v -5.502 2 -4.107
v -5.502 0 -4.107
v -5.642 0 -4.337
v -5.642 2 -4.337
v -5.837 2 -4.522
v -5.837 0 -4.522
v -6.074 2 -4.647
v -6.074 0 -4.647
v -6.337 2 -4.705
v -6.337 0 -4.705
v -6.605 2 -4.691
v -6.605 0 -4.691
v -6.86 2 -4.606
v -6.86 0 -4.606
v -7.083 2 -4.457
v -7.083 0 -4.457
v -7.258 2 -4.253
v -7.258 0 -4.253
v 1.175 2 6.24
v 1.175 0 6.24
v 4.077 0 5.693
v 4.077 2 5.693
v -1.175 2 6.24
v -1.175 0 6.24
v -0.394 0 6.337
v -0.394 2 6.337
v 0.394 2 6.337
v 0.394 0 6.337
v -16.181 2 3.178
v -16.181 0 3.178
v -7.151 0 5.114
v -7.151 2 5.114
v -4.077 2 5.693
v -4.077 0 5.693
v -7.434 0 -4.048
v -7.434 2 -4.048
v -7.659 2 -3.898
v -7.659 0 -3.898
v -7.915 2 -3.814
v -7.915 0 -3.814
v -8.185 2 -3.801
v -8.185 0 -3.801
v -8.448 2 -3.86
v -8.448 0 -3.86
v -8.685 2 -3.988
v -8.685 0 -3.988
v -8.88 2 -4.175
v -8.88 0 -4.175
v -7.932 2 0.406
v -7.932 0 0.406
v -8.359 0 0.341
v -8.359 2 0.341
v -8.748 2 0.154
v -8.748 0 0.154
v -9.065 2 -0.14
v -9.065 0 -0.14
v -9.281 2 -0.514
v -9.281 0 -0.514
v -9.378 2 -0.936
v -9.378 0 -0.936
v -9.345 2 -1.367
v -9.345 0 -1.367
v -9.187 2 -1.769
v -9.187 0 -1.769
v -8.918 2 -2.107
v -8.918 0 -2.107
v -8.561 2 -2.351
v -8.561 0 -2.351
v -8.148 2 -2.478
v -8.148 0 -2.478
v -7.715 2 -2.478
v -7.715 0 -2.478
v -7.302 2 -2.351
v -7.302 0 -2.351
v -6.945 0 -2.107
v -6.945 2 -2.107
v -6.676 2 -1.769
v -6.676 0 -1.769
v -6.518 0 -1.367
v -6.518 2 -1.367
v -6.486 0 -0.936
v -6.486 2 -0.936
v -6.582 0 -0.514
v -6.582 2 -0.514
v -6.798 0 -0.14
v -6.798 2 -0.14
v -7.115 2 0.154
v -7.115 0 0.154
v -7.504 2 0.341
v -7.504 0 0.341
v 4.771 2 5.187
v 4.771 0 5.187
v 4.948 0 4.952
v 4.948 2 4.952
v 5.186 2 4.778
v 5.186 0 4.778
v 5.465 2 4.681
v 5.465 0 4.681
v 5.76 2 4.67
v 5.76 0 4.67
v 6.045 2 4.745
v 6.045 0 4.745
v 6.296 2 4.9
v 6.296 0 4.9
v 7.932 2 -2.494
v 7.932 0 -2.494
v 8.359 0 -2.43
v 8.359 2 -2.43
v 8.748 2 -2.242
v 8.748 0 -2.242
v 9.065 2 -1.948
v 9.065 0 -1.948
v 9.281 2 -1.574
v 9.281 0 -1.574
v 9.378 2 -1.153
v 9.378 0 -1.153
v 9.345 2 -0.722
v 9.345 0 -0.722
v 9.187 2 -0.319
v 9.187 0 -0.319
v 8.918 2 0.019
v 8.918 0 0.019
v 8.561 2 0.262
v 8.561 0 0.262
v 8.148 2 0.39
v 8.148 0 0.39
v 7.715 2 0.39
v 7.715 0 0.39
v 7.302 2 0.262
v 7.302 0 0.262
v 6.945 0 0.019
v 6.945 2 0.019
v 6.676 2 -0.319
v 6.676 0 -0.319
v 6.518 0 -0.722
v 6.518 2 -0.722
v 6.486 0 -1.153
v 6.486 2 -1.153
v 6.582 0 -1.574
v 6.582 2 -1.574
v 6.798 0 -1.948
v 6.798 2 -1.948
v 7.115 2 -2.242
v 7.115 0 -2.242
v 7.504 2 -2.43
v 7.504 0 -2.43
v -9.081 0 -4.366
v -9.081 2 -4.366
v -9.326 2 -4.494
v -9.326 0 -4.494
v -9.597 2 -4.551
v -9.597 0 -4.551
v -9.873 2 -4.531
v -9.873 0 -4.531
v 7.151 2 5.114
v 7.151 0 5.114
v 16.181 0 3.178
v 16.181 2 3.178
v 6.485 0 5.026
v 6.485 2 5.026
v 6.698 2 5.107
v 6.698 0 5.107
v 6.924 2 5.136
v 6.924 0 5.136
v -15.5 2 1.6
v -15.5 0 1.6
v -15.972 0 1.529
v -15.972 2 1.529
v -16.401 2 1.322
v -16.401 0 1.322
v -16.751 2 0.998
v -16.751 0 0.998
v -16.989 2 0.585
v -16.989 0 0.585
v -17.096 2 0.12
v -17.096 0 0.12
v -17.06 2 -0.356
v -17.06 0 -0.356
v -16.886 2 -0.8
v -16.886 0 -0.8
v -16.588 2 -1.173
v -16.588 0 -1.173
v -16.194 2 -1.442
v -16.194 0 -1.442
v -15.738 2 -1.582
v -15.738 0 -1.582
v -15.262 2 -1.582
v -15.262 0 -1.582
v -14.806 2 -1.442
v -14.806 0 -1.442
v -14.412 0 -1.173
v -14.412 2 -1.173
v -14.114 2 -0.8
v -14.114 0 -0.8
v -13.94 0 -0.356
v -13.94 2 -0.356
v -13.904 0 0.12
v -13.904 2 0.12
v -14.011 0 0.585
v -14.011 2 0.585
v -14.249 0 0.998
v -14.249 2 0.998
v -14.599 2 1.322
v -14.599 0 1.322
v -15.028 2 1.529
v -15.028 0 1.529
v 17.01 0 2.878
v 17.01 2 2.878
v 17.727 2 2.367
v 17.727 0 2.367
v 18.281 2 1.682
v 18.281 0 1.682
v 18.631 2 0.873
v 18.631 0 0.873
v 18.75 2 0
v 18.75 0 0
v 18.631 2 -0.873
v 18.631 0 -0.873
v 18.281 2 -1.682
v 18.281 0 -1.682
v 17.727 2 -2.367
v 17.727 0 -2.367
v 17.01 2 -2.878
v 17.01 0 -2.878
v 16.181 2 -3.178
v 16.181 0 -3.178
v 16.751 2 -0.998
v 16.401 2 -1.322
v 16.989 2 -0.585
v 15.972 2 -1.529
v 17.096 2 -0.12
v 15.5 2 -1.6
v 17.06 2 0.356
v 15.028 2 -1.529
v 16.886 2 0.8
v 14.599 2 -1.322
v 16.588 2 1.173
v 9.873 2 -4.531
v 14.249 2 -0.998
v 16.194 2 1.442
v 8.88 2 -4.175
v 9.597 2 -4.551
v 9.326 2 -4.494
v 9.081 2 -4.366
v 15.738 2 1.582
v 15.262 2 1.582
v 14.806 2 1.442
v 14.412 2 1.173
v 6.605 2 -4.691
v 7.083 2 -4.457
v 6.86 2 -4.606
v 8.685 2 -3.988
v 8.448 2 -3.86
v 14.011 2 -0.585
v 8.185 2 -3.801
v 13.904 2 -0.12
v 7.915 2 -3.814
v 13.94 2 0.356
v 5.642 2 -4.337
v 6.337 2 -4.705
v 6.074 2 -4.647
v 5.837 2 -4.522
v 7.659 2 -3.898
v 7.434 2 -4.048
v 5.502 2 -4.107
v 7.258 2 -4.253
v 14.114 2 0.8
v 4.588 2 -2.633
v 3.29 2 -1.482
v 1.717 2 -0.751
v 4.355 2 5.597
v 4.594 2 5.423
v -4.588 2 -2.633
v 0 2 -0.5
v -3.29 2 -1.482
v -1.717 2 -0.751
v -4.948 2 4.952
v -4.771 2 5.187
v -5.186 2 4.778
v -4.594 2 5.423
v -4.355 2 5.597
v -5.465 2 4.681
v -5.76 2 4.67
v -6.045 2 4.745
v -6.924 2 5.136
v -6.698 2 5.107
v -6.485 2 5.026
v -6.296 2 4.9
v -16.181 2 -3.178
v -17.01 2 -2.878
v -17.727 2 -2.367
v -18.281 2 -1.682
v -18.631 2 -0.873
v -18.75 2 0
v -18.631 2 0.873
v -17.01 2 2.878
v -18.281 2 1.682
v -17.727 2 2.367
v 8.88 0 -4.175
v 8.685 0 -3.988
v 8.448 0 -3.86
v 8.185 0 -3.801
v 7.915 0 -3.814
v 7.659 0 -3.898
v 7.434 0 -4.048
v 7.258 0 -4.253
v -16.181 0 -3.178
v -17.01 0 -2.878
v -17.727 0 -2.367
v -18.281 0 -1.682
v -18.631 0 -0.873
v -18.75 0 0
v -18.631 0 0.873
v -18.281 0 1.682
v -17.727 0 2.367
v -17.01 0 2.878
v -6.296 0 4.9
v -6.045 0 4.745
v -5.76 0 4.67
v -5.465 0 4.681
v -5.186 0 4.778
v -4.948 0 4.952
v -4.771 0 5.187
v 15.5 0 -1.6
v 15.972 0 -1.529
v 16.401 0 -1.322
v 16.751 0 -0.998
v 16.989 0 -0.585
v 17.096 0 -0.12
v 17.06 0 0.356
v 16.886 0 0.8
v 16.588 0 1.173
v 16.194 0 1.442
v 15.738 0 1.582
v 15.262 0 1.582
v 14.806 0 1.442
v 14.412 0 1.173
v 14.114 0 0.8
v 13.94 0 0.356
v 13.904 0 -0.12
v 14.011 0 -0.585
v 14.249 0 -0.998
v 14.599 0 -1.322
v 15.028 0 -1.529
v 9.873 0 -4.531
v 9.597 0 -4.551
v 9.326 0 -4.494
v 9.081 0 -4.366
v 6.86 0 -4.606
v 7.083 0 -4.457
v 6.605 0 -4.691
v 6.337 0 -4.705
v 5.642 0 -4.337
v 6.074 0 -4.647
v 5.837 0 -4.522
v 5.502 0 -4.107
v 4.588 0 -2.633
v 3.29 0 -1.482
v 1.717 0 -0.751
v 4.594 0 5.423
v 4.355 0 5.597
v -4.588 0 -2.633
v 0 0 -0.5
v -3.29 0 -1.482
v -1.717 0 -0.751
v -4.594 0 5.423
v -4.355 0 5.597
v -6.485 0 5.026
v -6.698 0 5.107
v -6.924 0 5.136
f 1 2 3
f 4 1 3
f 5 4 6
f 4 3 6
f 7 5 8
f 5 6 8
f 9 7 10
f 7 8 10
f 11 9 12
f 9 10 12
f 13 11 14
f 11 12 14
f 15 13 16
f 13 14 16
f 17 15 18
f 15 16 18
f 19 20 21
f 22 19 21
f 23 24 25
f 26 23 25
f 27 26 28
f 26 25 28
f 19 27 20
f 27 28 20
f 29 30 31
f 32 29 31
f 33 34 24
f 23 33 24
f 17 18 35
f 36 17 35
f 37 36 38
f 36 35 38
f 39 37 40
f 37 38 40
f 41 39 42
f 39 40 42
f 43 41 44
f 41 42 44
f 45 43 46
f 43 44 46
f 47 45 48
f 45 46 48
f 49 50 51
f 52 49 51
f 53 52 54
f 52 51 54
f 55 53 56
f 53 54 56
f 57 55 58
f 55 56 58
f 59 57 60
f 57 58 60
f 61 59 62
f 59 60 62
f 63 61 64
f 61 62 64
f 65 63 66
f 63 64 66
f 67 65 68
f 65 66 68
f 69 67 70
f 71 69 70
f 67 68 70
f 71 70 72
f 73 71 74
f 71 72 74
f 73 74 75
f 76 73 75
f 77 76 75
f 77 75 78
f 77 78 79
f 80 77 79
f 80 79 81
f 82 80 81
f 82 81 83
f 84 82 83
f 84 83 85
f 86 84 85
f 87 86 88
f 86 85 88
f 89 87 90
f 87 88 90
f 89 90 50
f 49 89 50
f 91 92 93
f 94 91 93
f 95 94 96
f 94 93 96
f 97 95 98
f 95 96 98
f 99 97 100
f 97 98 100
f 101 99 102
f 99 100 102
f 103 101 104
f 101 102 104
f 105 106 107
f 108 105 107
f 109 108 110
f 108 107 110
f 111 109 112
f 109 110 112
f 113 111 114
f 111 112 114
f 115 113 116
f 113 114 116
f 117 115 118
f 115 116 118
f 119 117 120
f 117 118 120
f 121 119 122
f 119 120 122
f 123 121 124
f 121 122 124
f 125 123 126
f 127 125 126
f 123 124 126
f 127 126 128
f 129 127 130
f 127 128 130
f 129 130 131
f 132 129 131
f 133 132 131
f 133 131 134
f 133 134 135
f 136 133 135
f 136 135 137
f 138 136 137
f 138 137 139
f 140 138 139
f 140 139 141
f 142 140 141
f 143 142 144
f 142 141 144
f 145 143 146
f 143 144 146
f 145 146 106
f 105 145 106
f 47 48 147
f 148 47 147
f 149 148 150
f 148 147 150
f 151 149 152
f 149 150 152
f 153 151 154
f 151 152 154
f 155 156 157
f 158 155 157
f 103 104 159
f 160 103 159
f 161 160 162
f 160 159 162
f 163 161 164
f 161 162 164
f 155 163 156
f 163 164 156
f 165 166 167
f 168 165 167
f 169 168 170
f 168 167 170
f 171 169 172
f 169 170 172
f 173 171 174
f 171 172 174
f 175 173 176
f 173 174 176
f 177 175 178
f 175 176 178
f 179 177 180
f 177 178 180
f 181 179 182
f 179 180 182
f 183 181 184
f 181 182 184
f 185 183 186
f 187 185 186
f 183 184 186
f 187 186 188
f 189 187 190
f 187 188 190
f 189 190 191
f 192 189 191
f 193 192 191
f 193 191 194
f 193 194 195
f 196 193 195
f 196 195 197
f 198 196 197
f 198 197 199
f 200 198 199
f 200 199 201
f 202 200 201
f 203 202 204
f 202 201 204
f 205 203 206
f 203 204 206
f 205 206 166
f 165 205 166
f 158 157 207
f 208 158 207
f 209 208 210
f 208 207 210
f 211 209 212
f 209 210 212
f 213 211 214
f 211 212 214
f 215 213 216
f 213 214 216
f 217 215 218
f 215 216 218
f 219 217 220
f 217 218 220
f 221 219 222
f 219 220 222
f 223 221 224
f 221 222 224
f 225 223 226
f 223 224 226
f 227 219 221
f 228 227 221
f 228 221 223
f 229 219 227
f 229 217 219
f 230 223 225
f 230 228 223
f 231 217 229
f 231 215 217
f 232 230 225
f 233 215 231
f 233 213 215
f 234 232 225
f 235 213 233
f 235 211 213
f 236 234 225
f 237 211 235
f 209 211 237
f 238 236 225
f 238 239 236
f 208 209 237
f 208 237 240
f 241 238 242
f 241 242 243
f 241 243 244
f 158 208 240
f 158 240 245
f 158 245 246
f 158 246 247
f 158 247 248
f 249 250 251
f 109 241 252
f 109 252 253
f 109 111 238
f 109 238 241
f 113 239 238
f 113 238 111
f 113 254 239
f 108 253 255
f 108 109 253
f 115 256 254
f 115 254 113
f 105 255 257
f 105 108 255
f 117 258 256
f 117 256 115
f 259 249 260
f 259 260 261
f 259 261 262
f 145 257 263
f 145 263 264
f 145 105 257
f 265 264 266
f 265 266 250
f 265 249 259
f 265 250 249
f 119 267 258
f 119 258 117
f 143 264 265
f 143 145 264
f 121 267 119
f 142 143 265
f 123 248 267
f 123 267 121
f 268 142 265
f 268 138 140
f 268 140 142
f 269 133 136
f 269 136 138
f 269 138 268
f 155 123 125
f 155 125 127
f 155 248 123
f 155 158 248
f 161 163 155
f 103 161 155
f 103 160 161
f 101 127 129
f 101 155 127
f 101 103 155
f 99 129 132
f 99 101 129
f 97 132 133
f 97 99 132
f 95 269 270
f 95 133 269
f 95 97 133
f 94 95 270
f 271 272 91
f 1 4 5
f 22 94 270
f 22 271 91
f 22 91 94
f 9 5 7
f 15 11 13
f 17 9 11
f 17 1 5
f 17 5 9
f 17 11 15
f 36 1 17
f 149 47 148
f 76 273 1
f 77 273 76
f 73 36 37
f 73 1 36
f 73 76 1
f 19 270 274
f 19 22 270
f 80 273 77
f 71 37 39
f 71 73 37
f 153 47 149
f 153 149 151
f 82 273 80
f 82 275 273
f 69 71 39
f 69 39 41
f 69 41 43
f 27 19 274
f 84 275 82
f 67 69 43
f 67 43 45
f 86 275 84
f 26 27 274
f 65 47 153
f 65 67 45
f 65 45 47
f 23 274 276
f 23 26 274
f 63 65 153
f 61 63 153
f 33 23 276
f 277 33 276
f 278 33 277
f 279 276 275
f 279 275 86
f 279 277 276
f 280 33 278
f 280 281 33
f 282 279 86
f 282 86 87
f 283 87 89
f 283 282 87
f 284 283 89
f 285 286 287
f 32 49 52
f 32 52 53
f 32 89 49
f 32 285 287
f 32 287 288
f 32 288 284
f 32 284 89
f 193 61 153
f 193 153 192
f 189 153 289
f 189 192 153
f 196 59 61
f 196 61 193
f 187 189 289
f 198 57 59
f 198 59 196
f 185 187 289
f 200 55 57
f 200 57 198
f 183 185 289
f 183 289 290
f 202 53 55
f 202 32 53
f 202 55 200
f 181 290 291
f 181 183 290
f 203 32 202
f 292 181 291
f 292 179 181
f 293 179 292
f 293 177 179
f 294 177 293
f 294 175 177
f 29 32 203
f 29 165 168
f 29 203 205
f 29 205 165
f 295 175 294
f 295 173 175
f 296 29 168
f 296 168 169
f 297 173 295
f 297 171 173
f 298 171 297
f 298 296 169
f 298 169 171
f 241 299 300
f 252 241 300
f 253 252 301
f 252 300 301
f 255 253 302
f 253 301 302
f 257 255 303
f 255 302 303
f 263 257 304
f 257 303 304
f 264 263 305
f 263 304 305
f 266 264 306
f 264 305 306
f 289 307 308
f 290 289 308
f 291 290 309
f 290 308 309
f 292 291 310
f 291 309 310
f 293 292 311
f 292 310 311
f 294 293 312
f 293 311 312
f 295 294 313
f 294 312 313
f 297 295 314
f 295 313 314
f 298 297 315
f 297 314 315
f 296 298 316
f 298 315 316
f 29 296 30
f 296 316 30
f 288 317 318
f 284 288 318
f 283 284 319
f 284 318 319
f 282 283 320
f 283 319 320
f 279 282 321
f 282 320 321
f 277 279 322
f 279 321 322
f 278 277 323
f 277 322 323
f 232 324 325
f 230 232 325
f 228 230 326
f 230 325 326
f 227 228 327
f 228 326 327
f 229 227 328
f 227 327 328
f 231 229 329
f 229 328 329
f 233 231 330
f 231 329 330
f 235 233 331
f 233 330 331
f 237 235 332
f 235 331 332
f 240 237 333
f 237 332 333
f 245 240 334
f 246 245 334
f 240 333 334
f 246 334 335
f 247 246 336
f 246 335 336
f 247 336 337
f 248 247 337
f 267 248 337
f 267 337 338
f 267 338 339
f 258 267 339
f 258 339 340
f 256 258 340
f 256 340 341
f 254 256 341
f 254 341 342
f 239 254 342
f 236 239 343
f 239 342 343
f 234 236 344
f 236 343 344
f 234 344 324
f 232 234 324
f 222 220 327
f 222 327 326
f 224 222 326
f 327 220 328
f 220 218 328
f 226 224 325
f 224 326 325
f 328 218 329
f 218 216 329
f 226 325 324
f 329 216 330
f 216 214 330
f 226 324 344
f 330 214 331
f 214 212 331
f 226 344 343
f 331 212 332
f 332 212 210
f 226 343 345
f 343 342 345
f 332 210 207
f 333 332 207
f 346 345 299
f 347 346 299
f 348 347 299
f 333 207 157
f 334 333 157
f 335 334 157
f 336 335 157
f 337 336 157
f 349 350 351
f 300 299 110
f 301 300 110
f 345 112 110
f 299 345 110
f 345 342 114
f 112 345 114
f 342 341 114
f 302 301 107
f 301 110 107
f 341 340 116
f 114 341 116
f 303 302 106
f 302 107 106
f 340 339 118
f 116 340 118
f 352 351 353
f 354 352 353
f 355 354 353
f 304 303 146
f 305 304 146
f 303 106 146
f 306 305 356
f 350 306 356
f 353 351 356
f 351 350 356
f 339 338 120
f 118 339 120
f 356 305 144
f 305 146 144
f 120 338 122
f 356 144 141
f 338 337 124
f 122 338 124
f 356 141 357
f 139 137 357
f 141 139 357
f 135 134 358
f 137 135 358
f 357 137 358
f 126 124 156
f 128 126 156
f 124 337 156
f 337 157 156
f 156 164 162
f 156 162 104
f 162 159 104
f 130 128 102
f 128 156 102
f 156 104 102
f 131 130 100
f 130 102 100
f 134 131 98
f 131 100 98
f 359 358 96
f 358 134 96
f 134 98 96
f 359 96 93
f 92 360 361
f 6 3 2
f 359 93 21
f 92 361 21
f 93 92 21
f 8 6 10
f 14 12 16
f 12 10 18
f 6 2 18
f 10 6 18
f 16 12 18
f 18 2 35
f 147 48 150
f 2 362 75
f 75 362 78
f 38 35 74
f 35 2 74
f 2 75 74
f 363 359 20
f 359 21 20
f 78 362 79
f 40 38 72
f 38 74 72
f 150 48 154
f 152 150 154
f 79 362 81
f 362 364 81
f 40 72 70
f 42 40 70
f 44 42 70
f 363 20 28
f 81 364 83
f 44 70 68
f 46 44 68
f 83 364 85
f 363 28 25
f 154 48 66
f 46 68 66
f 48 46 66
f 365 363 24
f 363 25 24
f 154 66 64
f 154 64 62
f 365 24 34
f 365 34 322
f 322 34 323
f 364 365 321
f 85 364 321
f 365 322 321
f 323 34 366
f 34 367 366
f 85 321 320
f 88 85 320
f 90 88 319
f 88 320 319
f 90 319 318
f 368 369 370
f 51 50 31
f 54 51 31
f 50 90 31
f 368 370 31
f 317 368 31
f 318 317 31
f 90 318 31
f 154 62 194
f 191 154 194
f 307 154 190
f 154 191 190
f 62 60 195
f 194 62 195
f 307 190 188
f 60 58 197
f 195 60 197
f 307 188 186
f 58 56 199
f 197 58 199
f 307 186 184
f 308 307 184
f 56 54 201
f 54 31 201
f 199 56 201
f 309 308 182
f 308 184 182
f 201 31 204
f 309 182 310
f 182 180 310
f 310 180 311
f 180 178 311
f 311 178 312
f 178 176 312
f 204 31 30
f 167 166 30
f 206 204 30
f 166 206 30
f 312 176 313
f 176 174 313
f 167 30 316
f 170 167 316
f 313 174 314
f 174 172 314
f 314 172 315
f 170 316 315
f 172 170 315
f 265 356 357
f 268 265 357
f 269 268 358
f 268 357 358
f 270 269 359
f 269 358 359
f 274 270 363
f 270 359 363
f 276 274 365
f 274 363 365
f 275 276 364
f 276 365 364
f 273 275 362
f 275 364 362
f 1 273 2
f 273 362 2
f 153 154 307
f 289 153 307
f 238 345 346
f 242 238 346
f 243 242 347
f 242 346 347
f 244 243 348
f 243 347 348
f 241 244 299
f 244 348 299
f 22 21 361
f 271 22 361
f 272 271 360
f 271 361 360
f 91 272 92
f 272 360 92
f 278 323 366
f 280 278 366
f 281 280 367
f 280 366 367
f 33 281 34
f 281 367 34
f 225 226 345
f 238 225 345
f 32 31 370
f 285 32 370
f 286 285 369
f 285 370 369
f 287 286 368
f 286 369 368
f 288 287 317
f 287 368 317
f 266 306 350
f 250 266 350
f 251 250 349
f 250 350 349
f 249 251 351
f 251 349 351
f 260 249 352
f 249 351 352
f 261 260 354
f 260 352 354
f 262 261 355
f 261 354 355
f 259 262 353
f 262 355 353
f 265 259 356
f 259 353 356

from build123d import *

# Parameters (mm, degrees)
SKETCH1_R           = 1.599999998
SKETCH1_R_2         = 1.45
BOSS_EXTRUDE1_DEPTH = 2


with BuildPart() as part:
    # Sketch1 → Boss-Extrude1 (new body)
    with BuildSketch(Plane.XZ):
        with BuildLine():
            Line((16.181421483, -3.177760966), (9.872858324, -4.530534353))
            ThreePointArc((9.872858324, -4.530534353), (9.325880949, -4.494155653), (8.88026758, -4.174880875))
            ThreePointArc((8.88026758, -4.174880875), (8.049335418, -3.798153126), (7.258365077, -4.252837604))
            ThreePointArc((7.258365077, -4.252837604), (6.336866412, -4.705264718), (5.502330147, -4.107435892))
            ThreePointArc((5.502330147, -4.107435892), (0, -0.499999997), (-5.502330147, -4.107435892))
            ThreePointArc((-5.502330147, -4.107435892), (-6.336866412, -4.705264718), (-7.258365077, -4.252837604))
            ThreePointArc((-7.258365077, -4.252837604), (-8.049335418, -3.798153126), (-8.88026758, -4.174880875))
            ThreePointArc((-8.88026758, -4.174880875), (-9.325880949, -4.494155653), (-9.872858324, -4.530534353))
            Line((-9.872858324, -4.530534353), (-16.181421483, -3.177760966))
            ThreePointArc((-16.181421483, -3.177760966), (-18.749999999, 0), (-16.181421483, 3.177760966))
            Line((-16.181421483, 3.177760966), (-7.150681086, 5.114262981))
            ThreePointArc((-7.150681086, 5.114262981), (-6.698238018, 5.106573021), (-6.295506482, 4.900245189))
            ThreePointArc((-6.295506482, 4.900245189), (-5.464959808, 4.681269053), (-4.770928095, 5.187310858))
            ThreePointArc((-4.770928095, 5.187310858), (-4.48101085, 5.518641983), (-4.076896383, 5.693352662))
            Line((-4.076896383, 5.693352662), (-1.17489874, 6.239775137))
            ThreePointArc((-1.17489874, 6.239775137), (0, 6.34942366), (1.17489874, 6.239775137))
            Line((1.17489874, 6.239775137), (4.076896383, 5.693352662))
            ThreePointArc((4.076896383, 5.693352662), (4.48101085, 5.518641983), (4.770928095, 5.187310858))
            ThreePointArc((4.770928095, 5.187310858), (5.464959808, 4.681269053), (6.295506482, 4.900245189))
            ThreePointArc((6.295506482, 4.900245189), (6.698238018, 5.106573021), (7.150681086, 5.114262981))
            Line((7.150681086, 5.114262981), (16.181421483, 3.177760966))
            ThreePointArc((16.181421483, 3.177760966), (18.749999999, 0), (16.181421483, -3.177760966))
        make_face()
        with Locations(Location((-15.5, 0, 0), (0, 0, 90))):
            Circle(SKETCH1_R, mode=Mode.SUBTRACT)
        with Locations(Location((15.5, 0, 0), (0, 0, 270))):
            Circle(SKETCH1_R, mode=Mode.SUBTRACT)
        with Locations(Location((7.931558887, -1.04420954, 0), (0, 0, 270))):
            Circle(SKETCH1_R_2, mode=Mode.SUBTRACT)
        with Locations(Location((-7.931558887, -1.04420954, 0), (0, 0, 90))):
            Circle(SKETCH1_R_2, mode=Mode.SUBTRACT)
    extrude(amount=-BOSS_EXTRUDE1_DEPTH)


solid = part.part
